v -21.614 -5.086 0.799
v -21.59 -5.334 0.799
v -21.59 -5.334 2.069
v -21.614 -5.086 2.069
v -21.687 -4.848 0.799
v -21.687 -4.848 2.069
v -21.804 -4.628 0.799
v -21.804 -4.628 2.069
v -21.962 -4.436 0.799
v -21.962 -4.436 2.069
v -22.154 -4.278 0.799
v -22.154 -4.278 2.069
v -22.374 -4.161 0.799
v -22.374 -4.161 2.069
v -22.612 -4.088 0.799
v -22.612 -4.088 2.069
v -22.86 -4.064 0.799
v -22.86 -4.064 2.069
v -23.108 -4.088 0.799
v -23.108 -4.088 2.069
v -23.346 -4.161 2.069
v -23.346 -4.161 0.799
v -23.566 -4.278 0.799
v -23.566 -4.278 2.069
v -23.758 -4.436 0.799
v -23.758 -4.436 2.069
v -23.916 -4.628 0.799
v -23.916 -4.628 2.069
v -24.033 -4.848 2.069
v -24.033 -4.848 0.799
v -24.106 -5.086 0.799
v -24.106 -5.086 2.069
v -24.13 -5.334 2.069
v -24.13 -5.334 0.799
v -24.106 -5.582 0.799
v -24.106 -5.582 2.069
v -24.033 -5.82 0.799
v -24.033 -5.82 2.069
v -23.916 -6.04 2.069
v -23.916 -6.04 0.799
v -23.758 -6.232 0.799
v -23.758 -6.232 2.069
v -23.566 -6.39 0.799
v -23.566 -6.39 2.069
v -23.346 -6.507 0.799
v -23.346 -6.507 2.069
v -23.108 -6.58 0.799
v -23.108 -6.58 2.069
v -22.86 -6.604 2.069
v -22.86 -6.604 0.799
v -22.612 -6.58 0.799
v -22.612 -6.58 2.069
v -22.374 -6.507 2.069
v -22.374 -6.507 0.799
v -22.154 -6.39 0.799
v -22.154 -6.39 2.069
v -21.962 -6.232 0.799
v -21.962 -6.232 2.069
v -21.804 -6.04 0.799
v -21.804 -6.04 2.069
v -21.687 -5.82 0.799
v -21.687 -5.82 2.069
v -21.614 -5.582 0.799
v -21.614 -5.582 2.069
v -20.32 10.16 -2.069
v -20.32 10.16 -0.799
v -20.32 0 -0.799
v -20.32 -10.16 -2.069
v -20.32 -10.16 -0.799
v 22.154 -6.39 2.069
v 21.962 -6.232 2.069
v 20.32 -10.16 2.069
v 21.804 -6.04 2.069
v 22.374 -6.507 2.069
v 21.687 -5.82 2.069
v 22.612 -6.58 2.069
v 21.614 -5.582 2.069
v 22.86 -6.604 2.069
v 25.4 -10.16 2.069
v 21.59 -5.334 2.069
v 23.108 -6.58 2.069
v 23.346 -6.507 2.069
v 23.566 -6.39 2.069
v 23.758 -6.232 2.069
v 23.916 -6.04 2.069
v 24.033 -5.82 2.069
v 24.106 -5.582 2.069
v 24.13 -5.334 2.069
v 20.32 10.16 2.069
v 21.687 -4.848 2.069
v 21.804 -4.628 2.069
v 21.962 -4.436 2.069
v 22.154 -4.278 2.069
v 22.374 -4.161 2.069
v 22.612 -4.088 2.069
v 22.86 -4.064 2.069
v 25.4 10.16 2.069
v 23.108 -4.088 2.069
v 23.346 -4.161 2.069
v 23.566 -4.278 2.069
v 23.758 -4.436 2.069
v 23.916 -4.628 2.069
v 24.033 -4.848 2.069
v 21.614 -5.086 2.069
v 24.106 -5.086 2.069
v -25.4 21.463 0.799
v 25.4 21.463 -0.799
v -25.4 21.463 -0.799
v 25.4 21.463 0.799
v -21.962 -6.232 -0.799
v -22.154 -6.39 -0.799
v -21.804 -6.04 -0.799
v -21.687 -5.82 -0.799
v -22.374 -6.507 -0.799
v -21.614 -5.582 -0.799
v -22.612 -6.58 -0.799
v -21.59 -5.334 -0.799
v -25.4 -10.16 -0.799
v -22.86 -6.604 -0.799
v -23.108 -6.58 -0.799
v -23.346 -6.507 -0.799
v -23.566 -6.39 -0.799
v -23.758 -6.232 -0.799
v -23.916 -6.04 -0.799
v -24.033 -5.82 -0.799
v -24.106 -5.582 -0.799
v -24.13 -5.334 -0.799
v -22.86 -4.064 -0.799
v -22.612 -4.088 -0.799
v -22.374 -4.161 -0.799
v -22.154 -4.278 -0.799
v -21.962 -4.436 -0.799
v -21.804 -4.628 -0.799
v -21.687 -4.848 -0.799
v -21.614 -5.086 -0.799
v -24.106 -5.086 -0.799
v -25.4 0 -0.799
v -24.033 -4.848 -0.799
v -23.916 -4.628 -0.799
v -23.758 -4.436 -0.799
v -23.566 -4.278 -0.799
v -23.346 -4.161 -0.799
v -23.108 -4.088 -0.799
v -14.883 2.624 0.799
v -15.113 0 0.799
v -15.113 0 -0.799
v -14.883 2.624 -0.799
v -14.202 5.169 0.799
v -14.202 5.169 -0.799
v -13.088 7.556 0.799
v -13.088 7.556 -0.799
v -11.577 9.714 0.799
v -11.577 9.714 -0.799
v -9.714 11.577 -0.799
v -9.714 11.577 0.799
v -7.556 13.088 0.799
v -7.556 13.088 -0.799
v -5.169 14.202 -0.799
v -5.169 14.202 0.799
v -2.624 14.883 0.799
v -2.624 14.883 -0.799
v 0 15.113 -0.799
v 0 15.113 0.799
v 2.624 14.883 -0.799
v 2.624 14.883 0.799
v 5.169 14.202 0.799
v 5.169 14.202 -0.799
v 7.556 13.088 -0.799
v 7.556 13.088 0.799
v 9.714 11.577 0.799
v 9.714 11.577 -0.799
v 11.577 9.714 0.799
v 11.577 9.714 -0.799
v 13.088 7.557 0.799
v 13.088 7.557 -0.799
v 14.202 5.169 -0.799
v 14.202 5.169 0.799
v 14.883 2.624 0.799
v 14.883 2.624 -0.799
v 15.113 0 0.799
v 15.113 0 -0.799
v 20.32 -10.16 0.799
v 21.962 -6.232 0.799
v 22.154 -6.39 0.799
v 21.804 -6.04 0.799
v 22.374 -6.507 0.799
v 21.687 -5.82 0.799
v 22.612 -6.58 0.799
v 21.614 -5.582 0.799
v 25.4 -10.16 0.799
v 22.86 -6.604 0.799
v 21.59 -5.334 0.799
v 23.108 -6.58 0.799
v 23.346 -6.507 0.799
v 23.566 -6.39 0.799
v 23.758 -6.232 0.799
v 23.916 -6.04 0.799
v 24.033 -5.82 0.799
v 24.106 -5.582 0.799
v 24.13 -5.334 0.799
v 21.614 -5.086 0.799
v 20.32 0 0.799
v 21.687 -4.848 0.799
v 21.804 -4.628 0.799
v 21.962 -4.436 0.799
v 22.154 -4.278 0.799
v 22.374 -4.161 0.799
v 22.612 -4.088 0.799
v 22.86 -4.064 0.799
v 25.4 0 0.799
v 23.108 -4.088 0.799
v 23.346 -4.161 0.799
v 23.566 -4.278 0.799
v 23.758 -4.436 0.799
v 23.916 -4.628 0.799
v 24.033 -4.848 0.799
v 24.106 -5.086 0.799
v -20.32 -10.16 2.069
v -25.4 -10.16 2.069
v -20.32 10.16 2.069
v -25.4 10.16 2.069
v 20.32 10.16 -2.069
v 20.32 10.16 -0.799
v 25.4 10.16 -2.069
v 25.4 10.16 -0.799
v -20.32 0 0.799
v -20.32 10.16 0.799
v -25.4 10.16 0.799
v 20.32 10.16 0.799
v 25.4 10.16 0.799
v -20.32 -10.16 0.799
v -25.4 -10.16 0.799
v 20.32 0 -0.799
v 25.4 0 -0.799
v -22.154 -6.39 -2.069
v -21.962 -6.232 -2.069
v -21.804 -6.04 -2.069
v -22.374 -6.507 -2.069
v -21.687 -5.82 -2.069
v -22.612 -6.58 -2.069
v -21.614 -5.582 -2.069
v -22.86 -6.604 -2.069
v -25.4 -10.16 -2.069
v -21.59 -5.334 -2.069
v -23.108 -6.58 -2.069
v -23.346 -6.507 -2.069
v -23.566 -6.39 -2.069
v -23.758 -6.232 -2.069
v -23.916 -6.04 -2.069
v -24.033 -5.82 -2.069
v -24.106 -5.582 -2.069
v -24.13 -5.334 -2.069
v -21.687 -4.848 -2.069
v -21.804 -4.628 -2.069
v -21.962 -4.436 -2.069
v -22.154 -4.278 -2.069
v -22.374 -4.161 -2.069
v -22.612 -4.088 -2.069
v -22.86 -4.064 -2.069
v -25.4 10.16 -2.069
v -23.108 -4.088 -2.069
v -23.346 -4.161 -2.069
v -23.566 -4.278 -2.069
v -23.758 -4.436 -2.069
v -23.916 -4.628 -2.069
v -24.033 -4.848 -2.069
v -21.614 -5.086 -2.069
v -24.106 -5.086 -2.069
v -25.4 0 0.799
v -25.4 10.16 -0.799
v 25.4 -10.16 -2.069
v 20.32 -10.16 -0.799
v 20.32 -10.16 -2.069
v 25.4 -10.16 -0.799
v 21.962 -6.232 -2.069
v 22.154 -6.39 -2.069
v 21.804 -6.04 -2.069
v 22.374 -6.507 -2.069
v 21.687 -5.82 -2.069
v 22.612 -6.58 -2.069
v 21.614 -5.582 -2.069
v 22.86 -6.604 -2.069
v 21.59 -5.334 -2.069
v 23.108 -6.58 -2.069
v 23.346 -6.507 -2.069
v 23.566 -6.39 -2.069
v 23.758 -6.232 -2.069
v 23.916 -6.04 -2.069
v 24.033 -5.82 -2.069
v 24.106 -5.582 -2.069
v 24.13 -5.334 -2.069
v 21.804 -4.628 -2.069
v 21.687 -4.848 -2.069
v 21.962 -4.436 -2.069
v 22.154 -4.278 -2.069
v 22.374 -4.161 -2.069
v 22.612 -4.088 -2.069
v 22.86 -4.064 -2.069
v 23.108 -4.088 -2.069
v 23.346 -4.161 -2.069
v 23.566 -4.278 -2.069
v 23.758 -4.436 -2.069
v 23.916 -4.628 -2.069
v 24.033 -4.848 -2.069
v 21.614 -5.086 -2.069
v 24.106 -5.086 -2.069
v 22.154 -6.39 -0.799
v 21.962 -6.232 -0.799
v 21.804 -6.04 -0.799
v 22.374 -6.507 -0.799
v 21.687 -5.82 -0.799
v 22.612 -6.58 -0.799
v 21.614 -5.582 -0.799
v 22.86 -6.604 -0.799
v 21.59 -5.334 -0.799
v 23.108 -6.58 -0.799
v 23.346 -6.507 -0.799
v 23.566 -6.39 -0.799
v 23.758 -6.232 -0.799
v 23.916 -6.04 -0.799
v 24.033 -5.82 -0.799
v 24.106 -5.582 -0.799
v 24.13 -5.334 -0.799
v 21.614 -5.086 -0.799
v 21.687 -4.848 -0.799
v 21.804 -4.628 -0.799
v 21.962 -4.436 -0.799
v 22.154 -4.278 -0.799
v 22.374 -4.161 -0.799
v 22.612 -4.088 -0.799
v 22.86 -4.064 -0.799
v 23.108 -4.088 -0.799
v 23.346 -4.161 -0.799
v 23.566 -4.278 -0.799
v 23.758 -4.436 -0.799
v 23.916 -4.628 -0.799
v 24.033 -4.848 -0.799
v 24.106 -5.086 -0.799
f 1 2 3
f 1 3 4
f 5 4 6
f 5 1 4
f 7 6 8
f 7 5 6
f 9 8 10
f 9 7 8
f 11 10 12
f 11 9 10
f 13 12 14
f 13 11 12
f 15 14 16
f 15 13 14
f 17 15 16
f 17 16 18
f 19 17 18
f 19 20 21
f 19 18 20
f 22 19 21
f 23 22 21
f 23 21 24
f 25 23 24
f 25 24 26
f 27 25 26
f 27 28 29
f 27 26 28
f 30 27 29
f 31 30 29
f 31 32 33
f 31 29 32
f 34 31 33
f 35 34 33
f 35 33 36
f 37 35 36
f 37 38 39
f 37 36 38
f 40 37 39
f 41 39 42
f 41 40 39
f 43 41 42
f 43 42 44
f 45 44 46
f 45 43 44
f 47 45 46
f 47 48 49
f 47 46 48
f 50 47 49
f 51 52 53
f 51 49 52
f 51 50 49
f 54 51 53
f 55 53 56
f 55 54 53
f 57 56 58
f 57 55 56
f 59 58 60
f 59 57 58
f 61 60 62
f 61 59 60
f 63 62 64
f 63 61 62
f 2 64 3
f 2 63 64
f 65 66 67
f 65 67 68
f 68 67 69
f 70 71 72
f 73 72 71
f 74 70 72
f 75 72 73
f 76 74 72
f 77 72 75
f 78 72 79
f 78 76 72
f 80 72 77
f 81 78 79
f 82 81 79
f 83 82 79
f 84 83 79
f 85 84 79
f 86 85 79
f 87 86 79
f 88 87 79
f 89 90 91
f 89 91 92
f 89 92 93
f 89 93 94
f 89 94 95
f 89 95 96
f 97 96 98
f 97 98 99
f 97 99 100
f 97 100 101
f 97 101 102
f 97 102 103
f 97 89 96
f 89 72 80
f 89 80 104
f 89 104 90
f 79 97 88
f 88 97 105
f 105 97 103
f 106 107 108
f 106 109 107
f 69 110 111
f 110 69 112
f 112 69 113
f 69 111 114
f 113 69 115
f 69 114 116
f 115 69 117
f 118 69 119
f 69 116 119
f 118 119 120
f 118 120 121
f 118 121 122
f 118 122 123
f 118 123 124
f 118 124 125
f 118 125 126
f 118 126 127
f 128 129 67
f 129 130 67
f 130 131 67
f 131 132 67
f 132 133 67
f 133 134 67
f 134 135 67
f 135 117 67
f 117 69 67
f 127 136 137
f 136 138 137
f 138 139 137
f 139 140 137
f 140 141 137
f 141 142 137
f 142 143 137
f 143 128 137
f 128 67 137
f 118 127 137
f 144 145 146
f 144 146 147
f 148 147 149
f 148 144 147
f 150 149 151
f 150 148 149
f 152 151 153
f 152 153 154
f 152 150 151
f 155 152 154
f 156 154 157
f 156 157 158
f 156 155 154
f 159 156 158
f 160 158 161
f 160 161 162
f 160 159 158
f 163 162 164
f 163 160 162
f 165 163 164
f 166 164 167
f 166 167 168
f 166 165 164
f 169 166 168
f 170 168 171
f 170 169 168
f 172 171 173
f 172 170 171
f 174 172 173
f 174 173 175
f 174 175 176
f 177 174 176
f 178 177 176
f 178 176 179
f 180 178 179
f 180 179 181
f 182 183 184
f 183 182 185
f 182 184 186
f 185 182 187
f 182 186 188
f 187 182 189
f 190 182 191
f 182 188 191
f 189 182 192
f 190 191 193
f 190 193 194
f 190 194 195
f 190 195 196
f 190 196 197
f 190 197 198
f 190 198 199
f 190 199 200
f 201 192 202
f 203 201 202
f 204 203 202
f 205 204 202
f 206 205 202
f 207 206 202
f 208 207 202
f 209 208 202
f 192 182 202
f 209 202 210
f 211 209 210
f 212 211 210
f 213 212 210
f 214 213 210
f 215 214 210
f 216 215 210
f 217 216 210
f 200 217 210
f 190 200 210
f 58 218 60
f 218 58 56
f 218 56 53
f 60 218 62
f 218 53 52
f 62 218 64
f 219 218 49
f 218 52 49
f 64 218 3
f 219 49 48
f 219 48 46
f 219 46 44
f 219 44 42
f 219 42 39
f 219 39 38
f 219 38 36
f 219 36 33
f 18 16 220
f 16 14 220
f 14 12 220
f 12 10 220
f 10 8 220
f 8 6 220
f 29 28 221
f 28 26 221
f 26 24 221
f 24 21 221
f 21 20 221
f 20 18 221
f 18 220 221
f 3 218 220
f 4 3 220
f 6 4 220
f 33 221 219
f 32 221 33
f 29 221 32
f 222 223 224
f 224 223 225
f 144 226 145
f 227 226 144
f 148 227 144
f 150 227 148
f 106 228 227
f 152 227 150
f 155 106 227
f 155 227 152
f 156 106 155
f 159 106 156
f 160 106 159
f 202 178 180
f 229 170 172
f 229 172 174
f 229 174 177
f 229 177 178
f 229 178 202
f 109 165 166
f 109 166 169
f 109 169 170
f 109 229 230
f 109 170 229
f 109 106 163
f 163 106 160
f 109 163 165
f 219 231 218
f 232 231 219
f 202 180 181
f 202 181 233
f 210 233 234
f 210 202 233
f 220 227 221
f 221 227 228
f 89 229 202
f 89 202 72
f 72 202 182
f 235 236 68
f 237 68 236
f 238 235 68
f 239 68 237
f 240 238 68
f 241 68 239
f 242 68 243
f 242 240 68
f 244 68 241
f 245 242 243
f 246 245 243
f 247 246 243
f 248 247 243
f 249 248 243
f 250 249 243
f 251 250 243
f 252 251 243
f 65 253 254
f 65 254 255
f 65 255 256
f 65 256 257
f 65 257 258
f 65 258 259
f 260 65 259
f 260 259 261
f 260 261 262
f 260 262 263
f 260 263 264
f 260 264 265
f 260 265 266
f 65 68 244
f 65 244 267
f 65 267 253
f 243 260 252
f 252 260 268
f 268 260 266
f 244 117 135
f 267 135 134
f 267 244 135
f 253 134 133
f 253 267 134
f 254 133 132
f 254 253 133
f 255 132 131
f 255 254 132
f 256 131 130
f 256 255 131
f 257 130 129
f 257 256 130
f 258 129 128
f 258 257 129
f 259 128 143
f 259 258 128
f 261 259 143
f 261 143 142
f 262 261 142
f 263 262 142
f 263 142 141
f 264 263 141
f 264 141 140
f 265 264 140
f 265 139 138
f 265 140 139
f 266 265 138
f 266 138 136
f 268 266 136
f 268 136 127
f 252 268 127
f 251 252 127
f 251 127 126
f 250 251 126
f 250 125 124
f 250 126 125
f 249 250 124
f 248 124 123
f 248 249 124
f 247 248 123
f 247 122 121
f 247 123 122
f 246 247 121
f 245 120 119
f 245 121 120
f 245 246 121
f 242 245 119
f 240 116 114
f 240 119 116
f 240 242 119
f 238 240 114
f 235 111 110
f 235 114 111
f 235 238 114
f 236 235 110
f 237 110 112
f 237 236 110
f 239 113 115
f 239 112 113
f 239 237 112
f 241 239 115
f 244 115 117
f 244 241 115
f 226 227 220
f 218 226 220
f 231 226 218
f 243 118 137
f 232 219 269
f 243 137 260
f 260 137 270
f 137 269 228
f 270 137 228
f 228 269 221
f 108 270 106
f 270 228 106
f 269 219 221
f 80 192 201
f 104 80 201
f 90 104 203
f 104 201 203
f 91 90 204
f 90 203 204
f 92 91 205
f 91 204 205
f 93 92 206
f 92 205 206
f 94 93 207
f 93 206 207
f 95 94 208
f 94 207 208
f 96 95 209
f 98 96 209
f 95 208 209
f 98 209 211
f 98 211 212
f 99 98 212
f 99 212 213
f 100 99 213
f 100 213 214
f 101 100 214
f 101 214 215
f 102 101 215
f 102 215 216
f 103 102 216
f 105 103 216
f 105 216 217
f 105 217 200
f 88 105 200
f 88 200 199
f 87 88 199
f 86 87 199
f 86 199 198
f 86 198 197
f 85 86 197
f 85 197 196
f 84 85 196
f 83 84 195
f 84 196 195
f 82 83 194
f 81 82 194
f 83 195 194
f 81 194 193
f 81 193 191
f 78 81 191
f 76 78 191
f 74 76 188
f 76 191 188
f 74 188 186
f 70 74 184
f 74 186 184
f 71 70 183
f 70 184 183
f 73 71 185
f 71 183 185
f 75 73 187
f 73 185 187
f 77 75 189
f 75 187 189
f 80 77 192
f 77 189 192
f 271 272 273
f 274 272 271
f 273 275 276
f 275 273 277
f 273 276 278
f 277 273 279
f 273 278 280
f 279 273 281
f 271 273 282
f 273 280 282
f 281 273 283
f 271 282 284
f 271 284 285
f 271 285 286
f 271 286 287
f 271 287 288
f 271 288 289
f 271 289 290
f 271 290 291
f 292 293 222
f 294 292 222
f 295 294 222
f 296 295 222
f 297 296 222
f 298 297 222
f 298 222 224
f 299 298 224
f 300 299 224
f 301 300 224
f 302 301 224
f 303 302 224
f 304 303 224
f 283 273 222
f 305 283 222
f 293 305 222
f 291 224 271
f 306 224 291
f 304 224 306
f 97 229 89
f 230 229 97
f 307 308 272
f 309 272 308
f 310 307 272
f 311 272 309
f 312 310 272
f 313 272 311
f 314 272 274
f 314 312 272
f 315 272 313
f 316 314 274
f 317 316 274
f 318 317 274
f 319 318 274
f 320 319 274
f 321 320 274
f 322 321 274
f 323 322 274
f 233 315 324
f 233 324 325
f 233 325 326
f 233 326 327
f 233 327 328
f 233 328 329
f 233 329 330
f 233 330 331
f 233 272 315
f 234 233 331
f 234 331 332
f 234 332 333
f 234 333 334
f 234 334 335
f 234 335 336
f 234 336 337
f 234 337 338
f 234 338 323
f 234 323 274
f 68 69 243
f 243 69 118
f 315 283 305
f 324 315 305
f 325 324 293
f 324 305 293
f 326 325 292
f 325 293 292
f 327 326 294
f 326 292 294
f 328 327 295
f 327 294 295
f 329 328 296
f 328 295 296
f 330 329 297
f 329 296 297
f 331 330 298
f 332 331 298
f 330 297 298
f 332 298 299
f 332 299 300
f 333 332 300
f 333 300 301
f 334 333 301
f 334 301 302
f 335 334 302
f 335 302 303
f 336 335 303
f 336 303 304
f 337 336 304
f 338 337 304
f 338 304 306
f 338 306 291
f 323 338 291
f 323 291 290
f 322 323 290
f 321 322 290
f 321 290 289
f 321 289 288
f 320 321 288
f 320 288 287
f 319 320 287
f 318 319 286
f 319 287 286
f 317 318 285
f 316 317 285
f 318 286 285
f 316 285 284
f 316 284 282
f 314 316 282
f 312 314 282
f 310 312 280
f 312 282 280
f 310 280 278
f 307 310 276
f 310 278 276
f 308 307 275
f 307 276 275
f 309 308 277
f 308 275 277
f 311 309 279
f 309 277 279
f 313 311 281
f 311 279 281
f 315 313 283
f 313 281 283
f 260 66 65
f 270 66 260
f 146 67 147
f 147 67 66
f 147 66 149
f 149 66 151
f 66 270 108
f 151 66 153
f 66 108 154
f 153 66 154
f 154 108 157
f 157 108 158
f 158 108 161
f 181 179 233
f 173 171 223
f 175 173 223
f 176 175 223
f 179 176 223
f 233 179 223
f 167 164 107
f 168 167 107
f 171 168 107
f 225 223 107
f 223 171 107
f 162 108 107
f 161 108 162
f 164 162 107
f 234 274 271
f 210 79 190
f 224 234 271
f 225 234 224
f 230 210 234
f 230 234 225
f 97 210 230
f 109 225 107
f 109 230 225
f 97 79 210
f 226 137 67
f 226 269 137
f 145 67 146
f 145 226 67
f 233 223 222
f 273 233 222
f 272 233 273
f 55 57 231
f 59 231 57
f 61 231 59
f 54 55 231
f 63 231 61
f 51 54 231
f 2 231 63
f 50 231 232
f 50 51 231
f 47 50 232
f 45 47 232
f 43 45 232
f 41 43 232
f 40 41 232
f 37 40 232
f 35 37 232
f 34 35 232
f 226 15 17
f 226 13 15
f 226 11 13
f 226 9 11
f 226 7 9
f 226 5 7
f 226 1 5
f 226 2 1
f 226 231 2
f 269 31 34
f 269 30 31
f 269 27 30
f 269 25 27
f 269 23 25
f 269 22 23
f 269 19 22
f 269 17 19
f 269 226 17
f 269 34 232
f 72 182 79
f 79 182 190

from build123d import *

# Parameters (mm, degrees)
BOSS_EXTRUDE1_DEPTH     = 0.798558565
SKETCH2_W               = 5.08
SKETCH2_H               = 10.16
BOSS_EXTRUDE3_DEPTH     = 1.27
MIRROR2_COPY_1_SKETCH_W = 5.08
MIRROR2_COPY_1_SKETCH_H = 10.16
MIRROR2_COPY_1_DEPTH    = 1.27
SKETCH3_R               = 1.27
CUT_EXTRUDE1_DEPTH      = 5.13711713


with BuildPart() as part:
    # Sketch1 → Boss-Extrude1 (new body, symmetric)
    with BuildSketch(Plane.XY):
        with BuildLine():
            Line((-25.4, 0), (-15.113, 0))
            ThreePointArc((-15.113, 0), (0, 15.113), (15.113, 0))
            Line((15.113, 0), (25.4, 0))
            Line((25.4, 0), (25.4, 21.463))
            Line((25.4, 21.463), (-25.4, 21.463))
            Line((-25.4, 21.463), (-25.4, 0))
        make_face()
    extrude(amount=BOSS_EXTRUDE1_DEPTH, both=True)

    # Sketch2 → Boss-Extrude3 (add)
    with BuildSketch(Plane.XY.offset(0.798558565)):
        with Locations((22.86, 5.08)):
            Rectangle(SKETCH2_W, SKETCH2_H)
        with Locations((22.86, -5.08)):
            Rectangle(SKETCH2_W, SKETCH2_H)
    boss_extrude3 = extrude(amount=BOSS_EXTRUDE3_DEPTH)

    # Mirror1: Boss-Extrude3 across plane
    add(boss_extrude3.mirror(Plane.XY))

    # Mirror2: Boss-Extrude3 across plane
    add(boss_extrude3.mirror(Plane(origin=(0, 0, 0), x_dir=(0, 0, 1), z_dir=(1, 0, 0))))

    # Mirror2 copy 1 sketch → Mirror2 copy 1 (add)
    with BuildSketch(Plane(origin=(0, 0, -0.798558565), x_dir=(-1, 0, 0), z_dir=(0, 0, -1))):
        with Locations((22.86, 5.08)):
            Rectangle(MIRROR2_COPY_1_SKETCH_W, MIRROR2_COPY_1_SKETCH_H)
        with Locations((22.86, -5.08)):
            Rectangle(MIRROR2_COPY_1_SKETCH_W, MIRROR2_COPY_1_SKETCH_H)
    extrude(amount=MIRROR2_COPY_1_DEPTH)

    # Sketch3 → Cut-Extrude1 (cut, through all)
    with BuildSketch(Plane(origin=(0, 0, -2.068558565), x_dir=(-1, 0, 0), z_dir=(0, 0, -1))):
        with Locations((-22.86, -5.334)):
            Circle(SKETCH3_R)
    cut_extrude1 = extrude(amount=-CUT_EXTRUDE1_DEPTH, mode=Mode.SUBTRACT)

    # Mirror3: Cut-Extrude1 across plane
    add(cut_extrude1.mirror(Plane(origin=(0, 0, 0), x_dir=(0, 0, 1), z_dir=(1, 0, 0))), mode=Mode.SUBTRACT)


solid = part.part
